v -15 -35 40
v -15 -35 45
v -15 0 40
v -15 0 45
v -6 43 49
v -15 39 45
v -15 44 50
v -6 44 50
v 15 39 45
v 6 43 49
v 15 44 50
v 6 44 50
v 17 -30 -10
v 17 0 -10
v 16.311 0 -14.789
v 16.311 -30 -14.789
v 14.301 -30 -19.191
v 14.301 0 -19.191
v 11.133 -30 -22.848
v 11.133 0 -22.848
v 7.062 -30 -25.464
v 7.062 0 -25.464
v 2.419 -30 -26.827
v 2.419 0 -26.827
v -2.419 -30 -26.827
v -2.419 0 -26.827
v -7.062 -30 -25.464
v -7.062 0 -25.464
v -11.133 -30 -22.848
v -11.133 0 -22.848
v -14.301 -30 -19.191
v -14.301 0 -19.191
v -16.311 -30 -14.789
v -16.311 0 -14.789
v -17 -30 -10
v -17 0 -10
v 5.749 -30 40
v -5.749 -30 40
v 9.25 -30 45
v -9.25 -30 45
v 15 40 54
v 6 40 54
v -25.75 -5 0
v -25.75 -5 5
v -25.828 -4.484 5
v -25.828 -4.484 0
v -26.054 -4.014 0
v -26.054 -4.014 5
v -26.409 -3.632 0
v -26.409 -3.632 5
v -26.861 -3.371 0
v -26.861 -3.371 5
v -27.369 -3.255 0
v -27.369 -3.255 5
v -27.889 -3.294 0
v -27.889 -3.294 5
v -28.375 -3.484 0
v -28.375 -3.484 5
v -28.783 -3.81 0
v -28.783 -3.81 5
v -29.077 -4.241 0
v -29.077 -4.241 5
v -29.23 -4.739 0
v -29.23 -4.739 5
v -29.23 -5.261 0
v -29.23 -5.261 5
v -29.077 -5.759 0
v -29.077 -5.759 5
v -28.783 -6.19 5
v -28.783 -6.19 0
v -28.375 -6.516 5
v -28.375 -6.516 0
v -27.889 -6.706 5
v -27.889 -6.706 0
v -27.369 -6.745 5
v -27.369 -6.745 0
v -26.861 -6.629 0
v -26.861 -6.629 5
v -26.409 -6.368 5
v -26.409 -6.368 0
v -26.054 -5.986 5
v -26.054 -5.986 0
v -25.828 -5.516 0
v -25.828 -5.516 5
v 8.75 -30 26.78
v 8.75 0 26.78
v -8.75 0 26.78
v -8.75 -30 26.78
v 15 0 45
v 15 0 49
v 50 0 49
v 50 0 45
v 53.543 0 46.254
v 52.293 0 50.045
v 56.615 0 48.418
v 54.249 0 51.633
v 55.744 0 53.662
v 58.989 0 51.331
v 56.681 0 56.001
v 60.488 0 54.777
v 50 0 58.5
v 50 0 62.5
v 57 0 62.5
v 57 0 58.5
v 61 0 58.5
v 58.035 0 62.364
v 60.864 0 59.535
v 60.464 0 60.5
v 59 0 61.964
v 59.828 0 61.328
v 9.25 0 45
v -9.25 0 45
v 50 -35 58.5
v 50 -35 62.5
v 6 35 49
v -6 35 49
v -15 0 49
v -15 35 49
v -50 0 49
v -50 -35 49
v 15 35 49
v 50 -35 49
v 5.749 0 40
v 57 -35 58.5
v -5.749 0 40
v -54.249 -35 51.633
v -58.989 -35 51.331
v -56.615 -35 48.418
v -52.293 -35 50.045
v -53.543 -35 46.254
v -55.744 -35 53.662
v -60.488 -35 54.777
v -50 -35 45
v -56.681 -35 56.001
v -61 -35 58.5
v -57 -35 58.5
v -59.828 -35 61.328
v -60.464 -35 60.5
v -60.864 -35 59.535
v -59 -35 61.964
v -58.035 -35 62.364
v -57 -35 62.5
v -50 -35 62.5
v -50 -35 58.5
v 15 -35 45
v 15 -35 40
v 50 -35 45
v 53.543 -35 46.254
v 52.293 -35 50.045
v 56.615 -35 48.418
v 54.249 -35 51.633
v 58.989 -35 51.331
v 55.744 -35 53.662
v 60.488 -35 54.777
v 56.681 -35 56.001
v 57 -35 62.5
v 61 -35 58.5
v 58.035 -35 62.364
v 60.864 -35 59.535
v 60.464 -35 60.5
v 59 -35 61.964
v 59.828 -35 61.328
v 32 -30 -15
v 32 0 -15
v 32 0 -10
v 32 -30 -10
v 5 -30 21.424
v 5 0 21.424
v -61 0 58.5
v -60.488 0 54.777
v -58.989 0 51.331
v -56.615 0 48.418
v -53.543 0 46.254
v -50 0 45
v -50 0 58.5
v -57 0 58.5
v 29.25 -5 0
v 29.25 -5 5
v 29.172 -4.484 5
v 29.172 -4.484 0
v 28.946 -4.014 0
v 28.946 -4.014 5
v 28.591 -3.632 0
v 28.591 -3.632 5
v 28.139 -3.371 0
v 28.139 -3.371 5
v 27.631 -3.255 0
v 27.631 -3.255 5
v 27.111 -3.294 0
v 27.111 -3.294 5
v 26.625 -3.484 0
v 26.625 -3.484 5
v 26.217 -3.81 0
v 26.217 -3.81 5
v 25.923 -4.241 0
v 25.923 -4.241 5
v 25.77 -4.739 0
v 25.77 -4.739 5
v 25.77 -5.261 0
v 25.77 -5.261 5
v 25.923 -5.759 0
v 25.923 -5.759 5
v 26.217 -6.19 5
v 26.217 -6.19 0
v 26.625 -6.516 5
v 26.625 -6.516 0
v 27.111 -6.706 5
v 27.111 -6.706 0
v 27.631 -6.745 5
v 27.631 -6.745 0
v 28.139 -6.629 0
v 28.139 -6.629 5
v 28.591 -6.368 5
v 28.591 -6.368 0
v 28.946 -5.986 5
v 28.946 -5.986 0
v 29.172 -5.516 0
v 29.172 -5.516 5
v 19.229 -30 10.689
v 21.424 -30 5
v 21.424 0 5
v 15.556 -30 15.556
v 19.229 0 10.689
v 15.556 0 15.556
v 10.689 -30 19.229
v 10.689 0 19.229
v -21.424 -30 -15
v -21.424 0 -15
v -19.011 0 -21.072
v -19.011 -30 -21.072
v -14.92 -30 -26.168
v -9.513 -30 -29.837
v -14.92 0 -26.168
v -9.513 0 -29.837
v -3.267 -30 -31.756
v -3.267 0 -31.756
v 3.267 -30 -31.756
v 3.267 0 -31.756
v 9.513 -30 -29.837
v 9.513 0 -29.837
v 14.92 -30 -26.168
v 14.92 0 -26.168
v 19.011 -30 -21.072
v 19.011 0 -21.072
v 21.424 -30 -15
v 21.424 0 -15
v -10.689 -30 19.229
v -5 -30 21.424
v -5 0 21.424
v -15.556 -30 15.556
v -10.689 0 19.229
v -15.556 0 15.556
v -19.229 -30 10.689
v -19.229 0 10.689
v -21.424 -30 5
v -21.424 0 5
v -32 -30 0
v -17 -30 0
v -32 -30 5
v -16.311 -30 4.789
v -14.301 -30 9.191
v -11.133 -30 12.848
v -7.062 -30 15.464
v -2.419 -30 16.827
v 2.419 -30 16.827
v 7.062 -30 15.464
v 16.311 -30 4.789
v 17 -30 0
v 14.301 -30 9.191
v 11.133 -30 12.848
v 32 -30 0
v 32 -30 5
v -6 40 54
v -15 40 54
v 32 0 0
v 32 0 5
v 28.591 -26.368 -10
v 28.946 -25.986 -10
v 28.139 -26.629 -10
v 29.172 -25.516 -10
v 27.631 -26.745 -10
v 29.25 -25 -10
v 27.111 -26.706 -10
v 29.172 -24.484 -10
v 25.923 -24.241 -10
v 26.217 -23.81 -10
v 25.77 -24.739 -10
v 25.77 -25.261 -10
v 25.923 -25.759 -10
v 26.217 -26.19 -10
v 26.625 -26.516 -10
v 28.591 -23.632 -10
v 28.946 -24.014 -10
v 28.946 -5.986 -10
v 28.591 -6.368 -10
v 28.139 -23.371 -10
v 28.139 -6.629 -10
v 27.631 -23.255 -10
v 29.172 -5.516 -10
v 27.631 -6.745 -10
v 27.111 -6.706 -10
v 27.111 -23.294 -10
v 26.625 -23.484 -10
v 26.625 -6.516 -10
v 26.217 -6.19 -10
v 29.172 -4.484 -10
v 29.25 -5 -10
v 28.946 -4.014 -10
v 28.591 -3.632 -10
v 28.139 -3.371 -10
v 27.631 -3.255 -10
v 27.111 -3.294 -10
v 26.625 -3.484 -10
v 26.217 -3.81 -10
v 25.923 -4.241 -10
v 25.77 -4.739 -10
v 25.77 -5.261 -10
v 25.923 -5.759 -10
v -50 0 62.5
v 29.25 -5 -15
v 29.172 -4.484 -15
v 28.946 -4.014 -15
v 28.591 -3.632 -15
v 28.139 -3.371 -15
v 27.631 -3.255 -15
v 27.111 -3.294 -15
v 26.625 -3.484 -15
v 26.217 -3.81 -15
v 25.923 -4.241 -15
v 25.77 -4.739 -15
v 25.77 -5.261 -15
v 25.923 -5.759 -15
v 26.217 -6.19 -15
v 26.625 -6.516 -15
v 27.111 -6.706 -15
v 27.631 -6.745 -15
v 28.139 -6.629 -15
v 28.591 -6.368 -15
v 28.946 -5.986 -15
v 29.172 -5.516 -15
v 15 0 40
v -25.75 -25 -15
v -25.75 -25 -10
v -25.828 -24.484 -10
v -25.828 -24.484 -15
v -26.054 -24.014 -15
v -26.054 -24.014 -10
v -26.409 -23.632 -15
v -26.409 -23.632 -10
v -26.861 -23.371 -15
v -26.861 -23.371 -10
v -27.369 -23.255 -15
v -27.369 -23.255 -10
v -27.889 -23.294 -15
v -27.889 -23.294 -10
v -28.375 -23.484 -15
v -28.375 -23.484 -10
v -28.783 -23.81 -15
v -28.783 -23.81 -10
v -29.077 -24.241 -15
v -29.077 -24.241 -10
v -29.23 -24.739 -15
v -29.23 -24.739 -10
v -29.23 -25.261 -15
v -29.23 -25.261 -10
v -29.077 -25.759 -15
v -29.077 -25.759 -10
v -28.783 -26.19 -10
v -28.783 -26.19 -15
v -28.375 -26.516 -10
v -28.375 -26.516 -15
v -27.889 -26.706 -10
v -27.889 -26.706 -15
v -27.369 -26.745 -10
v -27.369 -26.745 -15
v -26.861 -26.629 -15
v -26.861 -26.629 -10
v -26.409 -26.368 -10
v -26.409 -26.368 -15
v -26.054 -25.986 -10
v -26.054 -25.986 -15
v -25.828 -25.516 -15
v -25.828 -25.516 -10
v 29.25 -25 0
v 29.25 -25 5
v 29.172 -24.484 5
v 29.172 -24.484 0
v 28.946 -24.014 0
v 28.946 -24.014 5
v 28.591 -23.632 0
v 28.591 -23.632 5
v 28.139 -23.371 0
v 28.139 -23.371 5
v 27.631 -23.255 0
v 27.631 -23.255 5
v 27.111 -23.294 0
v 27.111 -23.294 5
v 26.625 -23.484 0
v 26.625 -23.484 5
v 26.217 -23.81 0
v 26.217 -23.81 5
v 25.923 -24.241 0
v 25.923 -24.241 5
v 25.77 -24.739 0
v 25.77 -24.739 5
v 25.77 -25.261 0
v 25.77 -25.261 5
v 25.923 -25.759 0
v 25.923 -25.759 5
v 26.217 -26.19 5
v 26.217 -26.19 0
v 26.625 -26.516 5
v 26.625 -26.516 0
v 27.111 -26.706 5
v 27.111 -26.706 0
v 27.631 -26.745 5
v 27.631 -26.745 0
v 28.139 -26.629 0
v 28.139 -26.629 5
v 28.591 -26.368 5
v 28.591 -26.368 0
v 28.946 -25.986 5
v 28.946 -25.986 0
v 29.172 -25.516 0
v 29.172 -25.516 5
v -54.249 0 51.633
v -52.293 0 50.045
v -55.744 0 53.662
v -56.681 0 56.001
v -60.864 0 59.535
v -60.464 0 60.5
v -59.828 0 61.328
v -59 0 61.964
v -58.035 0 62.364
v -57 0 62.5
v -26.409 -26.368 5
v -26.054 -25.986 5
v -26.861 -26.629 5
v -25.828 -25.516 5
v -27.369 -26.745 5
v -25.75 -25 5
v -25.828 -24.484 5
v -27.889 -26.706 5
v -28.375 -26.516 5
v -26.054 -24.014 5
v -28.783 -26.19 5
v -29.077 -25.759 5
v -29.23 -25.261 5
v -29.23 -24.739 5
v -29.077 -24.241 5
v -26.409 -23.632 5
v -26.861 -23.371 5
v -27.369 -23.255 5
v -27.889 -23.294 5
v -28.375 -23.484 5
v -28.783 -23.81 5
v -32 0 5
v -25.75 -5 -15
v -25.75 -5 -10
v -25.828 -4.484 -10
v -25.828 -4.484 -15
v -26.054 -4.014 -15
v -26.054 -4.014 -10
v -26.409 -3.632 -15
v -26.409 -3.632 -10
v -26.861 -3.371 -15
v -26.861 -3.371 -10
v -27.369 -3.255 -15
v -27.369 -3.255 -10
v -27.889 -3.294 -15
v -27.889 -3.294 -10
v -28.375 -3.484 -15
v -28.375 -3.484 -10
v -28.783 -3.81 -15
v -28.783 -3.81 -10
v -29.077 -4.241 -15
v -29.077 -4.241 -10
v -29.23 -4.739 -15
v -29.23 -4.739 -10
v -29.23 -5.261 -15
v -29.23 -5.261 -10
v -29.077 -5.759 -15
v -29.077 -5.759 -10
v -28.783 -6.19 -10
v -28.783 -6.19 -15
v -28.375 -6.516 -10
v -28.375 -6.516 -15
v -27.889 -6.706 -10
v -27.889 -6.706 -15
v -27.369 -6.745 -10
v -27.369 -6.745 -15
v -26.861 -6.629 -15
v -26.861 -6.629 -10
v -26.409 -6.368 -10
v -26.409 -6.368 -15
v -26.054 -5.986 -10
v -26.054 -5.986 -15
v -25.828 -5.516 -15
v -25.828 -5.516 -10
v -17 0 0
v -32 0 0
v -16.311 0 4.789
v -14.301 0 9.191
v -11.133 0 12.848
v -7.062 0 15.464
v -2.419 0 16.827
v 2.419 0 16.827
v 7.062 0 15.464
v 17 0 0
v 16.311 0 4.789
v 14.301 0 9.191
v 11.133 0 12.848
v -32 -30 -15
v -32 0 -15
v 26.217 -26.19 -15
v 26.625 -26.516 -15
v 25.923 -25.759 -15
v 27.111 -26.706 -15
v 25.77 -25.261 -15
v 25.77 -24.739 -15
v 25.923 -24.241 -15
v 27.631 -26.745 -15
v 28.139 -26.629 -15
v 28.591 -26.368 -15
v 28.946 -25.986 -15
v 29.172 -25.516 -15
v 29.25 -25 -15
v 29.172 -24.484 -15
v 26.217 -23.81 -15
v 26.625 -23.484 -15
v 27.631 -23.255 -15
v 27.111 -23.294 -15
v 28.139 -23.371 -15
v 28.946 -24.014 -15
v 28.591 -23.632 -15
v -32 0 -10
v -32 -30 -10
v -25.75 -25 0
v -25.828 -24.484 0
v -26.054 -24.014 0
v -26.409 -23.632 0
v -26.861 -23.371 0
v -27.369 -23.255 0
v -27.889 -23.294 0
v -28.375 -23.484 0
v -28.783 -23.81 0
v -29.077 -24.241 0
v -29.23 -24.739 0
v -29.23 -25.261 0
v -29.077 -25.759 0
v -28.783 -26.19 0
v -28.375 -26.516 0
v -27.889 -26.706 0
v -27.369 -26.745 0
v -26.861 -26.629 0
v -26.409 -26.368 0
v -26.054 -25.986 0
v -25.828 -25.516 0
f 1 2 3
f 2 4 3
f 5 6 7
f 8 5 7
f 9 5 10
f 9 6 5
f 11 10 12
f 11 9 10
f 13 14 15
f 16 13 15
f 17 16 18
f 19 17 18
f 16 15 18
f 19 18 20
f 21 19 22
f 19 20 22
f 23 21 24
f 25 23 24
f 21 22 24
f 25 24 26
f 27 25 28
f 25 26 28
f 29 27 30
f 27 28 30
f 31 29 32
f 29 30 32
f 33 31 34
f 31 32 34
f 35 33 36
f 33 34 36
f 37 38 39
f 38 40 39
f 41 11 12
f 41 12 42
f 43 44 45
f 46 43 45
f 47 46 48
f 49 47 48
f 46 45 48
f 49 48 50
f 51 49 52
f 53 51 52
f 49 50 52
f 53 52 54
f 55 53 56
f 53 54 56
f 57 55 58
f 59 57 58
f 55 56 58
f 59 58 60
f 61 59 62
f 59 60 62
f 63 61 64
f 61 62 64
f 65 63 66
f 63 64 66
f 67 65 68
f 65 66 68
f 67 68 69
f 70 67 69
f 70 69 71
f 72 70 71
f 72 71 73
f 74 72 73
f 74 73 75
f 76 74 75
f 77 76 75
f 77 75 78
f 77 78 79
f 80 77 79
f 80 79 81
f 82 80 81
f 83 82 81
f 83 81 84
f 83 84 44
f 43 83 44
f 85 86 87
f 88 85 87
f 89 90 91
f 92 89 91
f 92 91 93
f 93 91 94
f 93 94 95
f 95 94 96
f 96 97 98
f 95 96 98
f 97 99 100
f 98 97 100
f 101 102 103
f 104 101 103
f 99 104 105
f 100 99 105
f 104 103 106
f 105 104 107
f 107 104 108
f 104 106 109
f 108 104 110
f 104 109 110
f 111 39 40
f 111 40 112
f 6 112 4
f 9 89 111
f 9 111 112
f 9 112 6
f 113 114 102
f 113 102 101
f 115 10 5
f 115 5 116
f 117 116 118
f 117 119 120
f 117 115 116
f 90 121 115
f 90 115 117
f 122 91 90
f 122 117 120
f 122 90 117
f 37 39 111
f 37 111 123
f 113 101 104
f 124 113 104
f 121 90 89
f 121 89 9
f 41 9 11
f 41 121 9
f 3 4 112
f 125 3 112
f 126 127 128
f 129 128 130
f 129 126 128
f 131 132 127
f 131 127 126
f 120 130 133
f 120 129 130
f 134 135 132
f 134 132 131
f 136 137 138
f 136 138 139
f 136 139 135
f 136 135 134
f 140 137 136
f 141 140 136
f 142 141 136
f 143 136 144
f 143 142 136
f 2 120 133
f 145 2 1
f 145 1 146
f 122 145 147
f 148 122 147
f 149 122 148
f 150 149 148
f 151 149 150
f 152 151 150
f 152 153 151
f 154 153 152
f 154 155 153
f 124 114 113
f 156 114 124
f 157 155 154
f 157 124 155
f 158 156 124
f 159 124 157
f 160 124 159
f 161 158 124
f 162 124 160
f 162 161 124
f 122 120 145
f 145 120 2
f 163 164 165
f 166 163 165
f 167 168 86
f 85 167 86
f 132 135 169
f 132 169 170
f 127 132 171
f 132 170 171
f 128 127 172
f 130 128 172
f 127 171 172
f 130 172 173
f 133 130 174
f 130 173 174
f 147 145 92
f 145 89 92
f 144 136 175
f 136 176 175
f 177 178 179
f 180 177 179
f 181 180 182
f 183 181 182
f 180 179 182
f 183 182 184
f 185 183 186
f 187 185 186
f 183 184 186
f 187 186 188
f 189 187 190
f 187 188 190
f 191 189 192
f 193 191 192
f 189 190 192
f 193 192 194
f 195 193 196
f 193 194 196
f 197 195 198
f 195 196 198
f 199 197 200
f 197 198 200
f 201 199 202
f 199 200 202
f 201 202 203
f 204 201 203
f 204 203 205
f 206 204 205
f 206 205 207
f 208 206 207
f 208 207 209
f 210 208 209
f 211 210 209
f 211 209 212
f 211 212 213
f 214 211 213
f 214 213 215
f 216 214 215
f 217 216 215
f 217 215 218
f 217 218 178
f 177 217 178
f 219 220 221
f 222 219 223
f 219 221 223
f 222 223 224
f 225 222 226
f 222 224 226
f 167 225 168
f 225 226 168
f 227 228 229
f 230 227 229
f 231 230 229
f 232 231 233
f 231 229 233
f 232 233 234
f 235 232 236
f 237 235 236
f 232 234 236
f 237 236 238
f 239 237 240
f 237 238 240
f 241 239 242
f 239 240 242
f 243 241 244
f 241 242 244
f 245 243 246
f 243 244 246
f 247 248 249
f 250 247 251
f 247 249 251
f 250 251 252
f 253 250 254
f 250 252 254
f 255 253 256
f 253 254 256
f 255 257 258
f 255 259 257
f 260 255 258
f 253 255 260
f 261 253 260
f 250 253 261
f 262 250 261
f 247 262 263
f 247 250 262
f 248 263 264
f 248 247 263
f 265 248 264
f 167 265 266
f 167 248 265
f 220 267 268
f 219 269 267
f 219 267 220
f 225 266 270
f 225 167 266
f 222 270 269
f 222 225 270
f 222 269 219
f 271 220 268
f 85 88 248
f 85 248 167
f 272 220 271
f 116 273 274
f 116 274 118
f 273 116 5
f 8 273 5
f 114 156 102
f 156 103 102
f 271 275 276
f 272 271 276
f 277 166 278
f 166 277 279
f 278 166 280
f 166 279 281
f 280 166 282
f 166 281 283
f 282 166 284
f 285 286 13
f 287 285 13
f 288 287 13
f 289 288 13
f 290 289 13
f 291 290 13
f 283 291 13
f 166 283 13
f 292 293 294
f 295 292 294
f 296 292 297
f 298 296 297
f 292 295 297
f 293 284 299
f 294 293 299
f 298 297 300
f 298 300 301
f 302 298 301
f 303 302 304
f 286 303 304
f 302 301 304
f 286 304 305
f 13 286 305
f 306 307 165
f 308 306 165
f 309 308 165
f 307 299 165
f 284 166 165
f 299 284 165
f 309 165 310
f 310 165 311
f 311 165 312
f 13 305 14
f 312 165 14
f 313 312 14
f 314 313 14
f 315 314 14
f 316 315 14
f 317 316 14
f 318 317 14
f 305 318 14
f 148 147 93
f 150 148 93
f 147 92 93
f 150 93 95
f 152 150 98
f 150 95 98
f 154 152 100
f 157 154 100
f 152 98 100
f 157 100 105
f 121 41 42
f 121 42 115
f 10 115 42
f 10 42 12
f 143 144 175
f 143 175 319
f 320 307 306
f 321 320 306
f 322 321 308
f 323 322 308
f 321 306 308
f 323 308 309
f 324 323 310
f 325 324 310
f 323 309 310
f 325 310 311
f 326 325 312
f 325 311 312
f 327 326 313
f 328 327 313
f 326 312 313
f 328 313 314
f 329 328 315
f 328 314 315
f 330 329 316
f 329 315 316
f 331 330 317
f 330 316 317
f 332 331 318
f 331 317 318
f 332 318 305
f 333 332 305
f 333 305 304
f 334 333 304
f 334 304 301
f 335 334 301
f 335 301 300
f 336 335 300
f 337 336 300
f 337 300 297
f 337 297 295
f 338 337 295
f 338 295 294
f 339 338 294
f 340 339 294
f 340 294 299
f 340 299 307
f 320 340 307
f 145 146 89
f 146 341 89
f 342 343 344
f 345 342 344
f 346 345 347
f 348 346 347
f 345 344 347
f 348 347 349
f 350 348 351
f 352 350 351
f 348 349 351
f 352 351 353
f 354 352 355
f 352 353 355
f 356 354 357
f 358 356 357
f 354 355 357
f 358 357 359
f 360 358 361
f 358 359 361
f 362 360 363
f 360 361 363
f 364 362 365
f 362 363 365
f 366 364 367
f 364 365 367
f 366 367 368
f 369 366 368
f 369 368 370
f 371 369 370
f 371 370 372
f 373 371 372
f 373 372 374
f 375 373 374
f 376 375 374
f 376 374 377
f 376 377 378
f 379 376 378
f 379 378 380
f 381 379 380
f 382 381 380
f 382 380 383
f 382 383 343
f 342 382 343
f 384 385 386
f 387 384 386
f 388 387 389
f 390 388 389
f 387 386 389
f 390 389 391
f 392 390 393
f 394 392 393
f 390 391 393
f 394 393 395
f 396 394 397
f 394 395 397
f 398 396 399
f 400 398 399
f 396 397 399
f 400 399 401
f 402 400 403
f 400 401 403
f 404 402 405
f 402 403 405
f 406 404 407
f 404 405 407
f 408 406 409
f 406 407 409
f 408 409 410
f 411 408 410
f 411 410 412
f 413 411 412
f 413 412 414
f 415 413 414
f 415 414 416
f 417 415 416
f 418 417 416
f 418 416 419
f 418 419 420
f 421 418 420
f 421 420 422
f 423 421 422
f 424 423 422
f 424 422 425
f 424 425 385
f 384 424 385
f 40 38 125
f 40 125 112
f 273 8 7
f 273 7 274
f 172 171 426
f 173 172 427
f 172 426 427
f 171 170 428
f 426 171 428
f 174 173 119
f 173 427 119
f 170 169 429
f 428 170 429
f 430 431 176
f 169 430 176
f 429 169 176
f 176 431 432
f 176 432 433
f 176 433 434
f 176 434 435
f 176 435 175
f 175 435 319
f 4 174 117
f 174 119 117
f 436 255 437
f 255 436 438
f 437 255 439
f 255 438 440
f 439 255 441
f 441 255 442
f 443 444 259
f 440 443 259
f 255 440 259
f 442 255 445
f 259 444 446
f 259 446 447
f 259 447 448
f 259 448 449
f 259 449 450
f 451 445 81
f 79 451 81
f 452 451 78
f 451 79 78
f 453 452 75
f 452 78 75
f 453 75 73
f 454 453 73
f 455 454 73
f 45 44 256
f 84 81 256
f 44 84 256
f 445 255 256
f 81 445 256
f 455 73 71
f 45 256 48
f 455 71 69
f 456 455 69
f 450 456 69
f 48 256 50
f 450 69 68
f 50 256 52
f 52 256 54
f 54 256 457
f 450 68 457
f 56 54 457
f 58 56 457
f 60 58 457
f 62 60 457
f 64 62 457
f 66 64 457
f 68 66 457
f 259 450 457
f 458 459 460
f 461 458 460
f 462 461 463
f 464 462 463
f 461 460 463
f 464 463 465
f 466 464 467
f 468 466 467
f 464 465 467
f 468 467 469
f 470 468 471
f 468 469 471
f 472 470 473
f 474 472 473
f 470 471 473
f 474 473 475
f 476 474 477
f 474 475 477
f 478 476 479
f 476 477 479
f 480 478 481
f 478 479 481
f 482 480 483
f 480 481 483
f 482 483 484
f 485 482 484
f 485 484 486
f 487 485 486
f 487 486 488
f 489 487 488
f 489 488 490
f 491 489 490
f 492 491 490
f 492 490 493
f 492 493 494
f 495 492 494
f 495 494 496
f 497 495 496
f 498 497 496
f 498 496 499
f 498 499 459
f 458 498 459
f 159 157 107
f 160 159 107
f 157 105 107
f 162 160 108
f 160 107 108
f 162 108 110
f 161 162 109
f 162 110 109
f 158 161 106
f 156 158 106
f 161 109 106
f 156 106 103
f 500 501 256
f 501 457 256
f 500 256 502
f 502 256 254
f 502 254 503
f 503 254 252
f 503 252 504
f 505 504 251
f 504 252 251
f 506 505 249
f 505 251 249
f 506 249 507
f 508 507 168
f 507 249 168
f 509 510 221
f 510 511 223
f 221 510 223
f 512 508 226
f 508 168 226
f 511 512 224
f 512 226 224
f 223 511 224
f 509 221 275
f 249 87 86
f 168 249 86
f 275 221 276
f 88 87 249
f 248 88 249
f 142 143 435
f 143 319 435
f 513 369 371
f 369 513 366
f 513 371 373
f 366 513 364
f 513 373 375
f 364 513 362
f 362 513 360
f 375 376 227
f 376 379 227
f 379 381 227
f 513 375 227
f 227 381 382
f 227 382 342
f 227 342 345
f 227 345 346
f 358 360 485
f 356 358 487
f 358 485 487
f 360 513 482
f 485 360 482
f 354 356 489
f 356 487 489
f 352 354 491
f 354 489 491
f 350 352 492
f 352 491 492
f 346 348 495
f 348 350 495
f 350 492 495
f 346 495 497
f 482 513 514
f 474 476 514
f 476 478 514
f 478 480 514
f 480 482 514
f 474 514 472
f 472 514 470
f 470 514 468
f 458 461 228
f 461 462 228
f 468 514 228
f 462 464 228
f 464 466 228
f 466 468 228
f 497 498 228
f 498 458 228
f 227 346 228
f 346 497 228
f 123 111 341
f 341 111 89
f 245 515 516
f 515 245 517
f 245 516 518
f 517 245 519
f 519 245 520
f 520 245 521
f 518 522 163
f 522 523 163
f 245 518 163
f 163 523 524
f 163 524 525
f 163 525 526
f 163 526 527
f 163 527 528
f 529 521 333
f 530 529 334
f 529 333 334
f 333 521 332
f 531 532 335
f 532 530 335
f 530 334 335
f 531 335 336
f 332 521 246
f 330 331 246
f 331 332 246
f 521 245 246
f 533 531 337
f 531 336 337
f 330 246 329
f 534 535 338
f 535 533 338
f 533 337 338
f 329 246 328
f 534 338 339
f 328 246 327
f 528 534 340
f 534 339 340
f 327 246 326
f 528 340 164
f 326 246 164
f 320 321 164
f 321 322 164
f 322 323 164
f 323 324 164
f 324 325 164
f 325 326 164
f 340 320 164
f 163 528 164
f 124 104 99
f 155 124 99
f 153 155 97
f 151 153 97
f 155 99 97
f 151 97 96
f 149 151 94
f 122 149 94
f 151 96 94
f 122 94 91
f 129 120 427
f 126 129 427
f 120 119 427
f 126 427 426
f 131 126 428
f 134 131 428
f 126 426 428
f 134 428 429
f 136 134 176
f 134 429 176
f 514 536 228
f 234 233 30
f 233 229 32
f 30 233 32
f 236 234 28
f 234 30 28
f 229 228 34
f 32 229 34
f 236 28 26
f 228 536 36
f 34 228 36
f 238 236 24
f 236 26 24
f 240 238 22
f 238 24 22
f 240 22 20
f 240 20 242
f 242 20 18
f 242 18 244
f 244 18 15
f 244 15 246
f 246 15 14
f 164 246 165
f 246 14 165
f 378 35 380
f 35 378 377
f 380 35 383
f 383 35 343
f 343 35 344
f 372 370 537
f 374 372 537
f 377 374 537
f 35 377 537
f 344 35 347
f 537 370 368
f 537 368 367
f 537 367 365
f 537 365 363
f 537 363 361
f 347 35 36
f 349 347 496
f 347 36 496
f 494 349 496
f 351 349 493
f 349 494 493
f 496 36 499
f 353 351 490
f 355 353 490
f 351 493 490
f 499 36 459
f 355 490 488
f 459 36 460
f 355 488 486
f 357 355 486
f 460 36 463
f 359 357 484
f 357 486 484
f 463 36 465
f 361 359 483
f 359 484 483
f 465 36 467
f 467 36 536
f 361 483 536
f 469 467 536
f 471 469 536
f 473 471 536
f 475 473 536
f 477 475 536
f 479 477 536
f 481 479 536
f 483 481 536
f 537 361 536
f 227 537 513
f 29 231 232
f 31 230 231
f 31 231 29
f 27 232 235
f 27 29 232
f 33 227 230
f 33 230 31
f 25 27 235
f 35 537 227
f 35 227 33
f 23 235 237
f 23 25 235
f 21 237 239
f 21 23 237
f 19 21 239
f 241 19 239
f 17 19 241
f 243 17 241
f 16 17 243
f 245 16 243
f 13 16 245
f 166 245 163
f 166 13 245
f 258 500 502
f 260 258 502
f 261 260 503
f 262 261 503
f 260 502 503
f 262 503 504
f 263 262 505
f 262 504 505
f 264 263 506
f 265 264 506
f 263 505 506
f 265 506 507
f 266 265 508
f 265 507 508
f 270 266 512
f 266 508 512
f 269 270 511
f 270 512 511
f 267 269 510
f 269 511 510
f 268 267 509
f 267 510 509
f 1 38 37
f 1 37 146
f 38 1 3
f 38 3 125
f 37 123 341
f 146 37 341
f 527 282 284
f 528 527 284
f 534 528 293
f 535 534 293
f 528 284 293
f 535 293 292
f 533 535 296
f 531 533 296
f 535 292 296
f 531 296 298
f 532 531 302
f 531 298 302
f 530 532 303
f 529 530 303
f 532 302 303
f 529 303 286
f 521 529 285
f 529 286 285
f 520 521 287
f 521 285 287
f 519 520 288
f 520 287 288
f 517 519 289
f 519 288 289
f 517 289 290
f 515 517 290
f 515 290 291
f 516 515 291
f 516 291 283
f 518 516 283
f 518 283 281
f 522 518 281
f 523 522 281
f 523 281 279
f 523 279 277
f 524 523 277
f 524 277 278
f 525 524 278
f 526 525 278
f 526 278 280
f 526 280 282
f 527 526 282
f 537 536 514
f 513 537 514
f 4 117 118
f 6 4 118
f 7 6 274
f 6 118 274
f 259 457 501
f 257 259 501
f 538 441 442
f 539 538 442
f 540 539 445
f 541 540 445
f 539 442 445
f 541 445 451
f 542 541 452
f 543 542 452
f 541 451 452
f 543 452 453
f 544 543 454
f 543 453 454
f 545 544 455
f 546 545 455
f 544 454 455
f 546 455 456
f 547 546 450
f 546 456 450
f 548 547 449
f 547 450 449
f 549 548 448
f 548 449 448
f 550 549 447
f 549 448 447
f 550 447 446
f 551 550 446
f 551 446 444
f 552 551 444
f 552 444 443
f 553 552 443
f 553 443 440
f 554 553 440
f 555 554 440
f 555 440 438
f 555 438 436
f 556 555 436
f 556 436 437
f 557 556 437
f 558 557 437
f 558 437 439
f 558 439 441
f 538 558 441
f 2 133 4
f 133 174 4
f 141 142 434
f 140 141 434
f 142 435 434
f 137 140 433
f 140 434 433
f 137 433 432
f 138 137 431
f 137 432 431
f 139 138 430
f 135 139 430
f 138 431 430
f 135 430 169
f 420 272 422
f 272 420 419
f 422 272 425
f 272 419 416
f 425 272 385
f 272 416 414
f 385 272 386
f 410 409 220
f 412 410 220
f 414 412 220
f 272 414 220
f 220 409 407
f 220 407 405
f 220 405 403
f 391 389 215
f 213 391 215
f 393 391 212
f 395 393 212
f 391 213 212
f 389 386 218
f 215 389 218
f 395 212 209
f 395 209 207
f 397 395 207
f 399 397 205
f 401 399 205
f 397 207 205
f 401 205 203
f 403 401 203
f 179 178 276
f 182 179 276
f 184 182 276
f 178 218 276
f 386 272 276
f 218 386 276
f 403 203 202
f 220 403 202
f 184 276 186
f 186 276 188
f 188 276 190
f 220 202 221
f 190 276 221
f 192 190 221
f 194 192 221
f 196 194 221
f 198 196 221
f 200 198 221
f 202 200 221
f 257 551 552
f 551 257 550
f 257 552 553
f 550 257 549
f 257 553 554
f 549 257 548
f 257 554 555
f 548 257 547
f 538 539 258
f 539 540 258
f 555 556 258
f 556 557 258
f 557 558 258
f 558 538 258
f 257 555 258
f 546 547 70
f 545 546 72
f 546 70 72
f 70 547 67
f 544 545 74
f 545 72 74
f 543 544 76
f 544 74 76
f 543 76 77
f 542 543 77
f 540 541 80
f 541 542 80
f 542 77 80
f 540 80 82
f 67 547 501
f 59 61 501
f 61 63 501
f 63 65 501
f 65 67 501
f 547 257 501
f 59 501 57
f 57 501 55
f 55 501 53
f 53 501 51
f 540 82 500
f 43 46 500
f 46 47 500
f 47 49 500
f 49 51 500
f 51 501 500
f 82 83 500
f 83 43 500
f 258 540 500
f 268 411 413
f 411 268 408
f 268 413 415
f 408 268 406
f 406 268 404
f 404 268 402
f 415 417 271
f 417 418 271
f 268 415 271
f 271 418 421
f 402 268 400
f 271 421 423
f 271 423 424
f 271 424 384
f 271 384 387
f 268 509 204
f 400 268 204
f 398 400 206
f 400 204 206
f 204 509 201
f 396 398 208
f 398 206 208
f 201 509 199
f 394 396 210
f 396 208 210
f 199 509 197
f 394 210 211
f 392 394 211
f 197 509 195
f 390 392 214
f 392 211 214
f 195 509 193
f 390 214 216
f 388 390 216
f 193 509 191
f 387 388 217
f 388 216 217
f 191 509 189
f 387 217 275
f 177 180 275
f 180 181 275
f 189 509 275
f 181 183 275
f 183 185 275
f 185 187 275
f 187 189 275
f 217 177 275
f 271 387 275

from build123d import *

# Parameters (mm, degrees)
F3_DEPTH      = 30
F4_DEPTH      = 5
F6_DEPTH      = 15
F6_DEPTH_BACK = 15
F7_DEPTH      = 6
F8_DEPTH      = 30
F9_DEPTH      = 30
F10_R         = 1.75
F11_DEPTH     = 50


# Not quite as in the source:
# - a feature names something its author has since deleted; it is built from what else it names


with BuildPart() as f3:
    # F2 (on offset) → F3 (new body)
    with BuildSketch(Plane.XZ.offset(30)):
        with BuildLine():
            Line((50, 49), (-50, 49))
            ThreePointArc((-50, 49), (-55.0610018108, 52.5997881394), (-57, 58.5))
            Line((-57, 58.5), (-50, 58.5))
            Line((-50, 58.5), (-50, 62.5))
            Line((-50, 62.5), (-57, 62.5))
            ThreePointArc((-57, 62.5), (-59.8284271247, 61.3284271247), (-61, 58.5))
            ThreePointArc((-61, 58.5), (-57.9018186072, 49.7929626164), (-50, 45))
            Line((-50, 45), (-15, 45))
            Line((-15, 45), (-15, 40))
            Line((-15, 40), (-5.748962309, 40))
            Line((-5.748962309, 40), (-9.25, 45))
            Line((-9.25, 45), (9.25, 45))
            Line((9.25, 45), (5.748962309, 40))
            Line((5.748962309, 40), (15, 40))
            Line((15, 40), (15, 45))
            Line((15, 45), (50, 45))
            ThreePointArc((50, 45), (57.9018186072, 49.7929626164), (61, 58.5))
            ThreePointArc((61, 58.5), (59.8284271247, 61.3284271247), (57, 62.5))
            Line((57, 62.5), (50, 62.5))
            Line((50, 62.5), (50, 58.5))
            Line((50, 58.5), (57, 58.5))
            ThreePointArc((57, 58.5), (55.0610018108, 52.5997881394), (50, 49))
        make_face()
    extrude(amount=-F3_DEPTH)

    # F2 (on offset) → F4 (join)
    with BuildSketch(Plane.XZ.offset(30)):
        with BuildLine():
            Line((50, 49), (-50, 49))
            ThreePointArc((-50, 49), (-55.0610018108, 52.5997881394), (-57, 58.5))
            Line((-57, 58.5), (-50, 58.5))
            Line((-50, 58.5), (-50, 62.5))
            Line((-50, 62.5), (-57, 62.5))
            ThreePointArc((-57, 62.5), (-59.8284271247, 61.3284271247), (-61, 58.5))
            ThreePointArc((-61, 58.5), (-57.9018186072, 49.7929626164), (-50, 45))
            Line((-50, 45), (-15, 45))
            Line((-15, 45), (-15, 40))
            Line((-15, 40), (-5.748962309, 40))
            Line((-5.748962309, 40), (-9.25, 45))
            Line((-9.25, 45), (9.25, 45))
            Line((9.25, 45), (5.748962309, 40))
            Line((5.748962309, 40), (15, 40))
            Line((15, 40), (15, 45))
            Line((15, 45), (50, 45))
            ThreePointArc((50, 45), (57.9018186072, 49.7929626164), (61, 58.5))
            ThreePointArc((61, 58.5), (59.8284271247, 61.3284271247), (57, 62.5))
            Line((57, 62.5), (50, 62.5))
            Line((50, 62.5), (50, 58.5))
            Line((50, 58.5), (57, 58.5))
            ThreePointArc((57, 58.5), (55.0610018108, 52.5997881394), (50, 49))
        make_face()
        Polygon((-9.25, 45), (-5.748962309, 40), (5.748962309, 40), (9.25, 45), align=None)
    extrude(amount=F4_DEPTH)

    # F5 (on Right) → F6 (join, two sides)
    with BuildSketch(Plane.YZ) as f6_sk:
        Polygon((35, 49), (0, 49), (0, 45), (39, 45), (43, 49), align=None)
        Polygon((40, 54), (35, 49), (43, 49), (44, 50), align=None)
    extrude(amount=F6_DEPTH)
    extrude(f6_sk.sketch, amount=-F6_DEPTH_BACK)

    # F5 (on Right) → F7 (cut, symmetric)
    with BuildSketch(Plane.YZ):
        Polygon((40, 54), (35, 49), (43, 49), (44, 50), align=None)
    extrude(amount=F7_DEPTH, both=True, mode=Mode.SUBTRACT)


with BuildPart() as f8:
    # F0 (on Front) → F8 (new body)
    with BuildSketch(Plane.XZ):
        with BuildLine():
            Line((-32, 0), (-22, 0))
            ThreePointArc((-22, 0), (-21.8555974099, 2.516517804), (-21.4242852856, 5))
            Line((-21.4242852856, 5), (-32, 5))
            Line((-32, 5), (-32, 0))
        make_face()
        with BuildLine():
            Line((-22, 0), (-17, 0))
            Line((-17, 0), (-17, 5))
            Line((-17, 5), (-21.4242852856, 5))
            ThreePointArc((-21.4242852856, 5), (-21.8555974099, 2.516517804), (-22, 0))
        make_face()
        with BuildLine():
            ThreePointArc((-17, 0), (0, 17), (17, 0))
            Line((17, 0), (17, 5))
            Line((17, 5), (21.4242852856, 5))
            ThreePointArc((21.4242852856, 5), (15.5563491861, 15.5563491861), (5, 21.4242852856))
            ThreePointArc((5, 21.4242852856), (0, 22), (-5, 21.4242852856))
            ThreePointArc((-5, 21.4242852856), (-15.5563491861, 15.5563491861), (-21.4242852856, 5))
            Line((-21.4242852856, 5), (-17, 5))
            Line((-17, 5), (-17, 0))
        make_face()
        with BuildLine():
            Line((17, 5), (17, 0))
            Line((17, 0), (22, 0))
            ThreePointArc((22, 0), (21.8555974099, 2.516517804), (21.4242852856, 5))
            Line((21.4242852856, 5), (17, 5))
        make_face()
        with BuildLine():
            ThreePointArc((21.4242852856, 5), (21.8555974099, 2.516517804), (22, 0))
            Line((22, 0), (32, 0))
            Line((32, 0), (32, 5))
            Line((32, 5), (21.4242852856, 5))
        make_face()
        with BuildLine():
            ThreePointArc((-5, 21.4242852856), (0, 22), (5, 21.4242852856))
            Line((5, 21.4242852856), (8.75, 26.7798403109))
            Line((8.75, 26.7798403109), (-8.75, 26.7798403109))
            Line((-8.75, 26.7798403109), (-5, 21.4242852856))
        make_face()
    extrude(amount=F8_DEPTH)


with BuildPart() as f9:
    # F0 (on Front) → F9 (new body)
    with BuildSketch(Plane.XZ):
        with BuildLine():
            ThreePointArc((-21.4242852856, -15), (-21.8555974099, -12.516517804), (-22, -10))
            Line((-22, -10), (-32, -10))
            Line((-32, -10), (-32, -15))
            Line((-32, -15), (-21.4242852856, -15))
        make_face()
        with BuildLine():
            Line((-17, -15), (-17, -10))
            Line((-17, -10), (-22, -10))
            ThreePointArc((-22, -10), (-21.8555974099, -12.516517804), (-21.4242852856, -15))
            Line((-21.4242852856, -15), (-17, -15))
        make_face()
        with BuildLine():
            ThreePointArc((17, -10), (0, -27), (-17, -10))
            Line((-17, -10), (-17, -15))
            Line((-17, -15), (-21.4242852856, -15))
            ThreePointArc((-21.4242852856, -15), (0, -32), (21.4242852856, -15))
            Line((21.4242852856, -15), (17, -15))
            Line((17, -15), (17, -10))
        make_face()
        with BuildLine():
            Line((22, -10), (17, -10))
            Line((17, -10), (17, -15))
            Line((17, -15), (21.4242852856, -15))
            ThreePointArc((21.4242852856, -15), (21.8555974099, -12.516517804), (22, -10))
        make_face()
        with BuildLine():
            Line((32, -10), (22, -10))
            ThreePointArc((22, -10), (21.8555974099, -12.516517804), (21.4242852856, -15))
            Line((21.4242852856, -15), (32, -15))
            Line((32, -15), (32, -10))
        make_face()
    extrude(amount=F9_DEPTH)


with BuildPart() as f11_tool:
    # F10 (on face) → F11 (new body)
    with BuildSketch(Plane.XY.offset(5)):
        with Locations((-27.5, -25)):
            Circle(F10_R)
        with Locations((-27.5, -5)):
            Circle(F10_R)
        with Locations((27.5, -5)):
            Circle(F10_R)
        with Locations((27.5, -25)):
            Circle(F10_R)
    extrude(amount=-F11_DEPTH)


with BuildPart() as f8_1:
    add(f8.part)

    # F11: cut by f11_tool
    add(f11_tool.part, mode=Mode.SUBTRACT)


with BuildPart() as f9_1:
    add(f9.part)

    # F11: cut by f11_tool
    add(f11_tool.part, mode=Mode.SUBTRACT)


solid = Compound([f3.part, f8_1.part, f9_1.part])
